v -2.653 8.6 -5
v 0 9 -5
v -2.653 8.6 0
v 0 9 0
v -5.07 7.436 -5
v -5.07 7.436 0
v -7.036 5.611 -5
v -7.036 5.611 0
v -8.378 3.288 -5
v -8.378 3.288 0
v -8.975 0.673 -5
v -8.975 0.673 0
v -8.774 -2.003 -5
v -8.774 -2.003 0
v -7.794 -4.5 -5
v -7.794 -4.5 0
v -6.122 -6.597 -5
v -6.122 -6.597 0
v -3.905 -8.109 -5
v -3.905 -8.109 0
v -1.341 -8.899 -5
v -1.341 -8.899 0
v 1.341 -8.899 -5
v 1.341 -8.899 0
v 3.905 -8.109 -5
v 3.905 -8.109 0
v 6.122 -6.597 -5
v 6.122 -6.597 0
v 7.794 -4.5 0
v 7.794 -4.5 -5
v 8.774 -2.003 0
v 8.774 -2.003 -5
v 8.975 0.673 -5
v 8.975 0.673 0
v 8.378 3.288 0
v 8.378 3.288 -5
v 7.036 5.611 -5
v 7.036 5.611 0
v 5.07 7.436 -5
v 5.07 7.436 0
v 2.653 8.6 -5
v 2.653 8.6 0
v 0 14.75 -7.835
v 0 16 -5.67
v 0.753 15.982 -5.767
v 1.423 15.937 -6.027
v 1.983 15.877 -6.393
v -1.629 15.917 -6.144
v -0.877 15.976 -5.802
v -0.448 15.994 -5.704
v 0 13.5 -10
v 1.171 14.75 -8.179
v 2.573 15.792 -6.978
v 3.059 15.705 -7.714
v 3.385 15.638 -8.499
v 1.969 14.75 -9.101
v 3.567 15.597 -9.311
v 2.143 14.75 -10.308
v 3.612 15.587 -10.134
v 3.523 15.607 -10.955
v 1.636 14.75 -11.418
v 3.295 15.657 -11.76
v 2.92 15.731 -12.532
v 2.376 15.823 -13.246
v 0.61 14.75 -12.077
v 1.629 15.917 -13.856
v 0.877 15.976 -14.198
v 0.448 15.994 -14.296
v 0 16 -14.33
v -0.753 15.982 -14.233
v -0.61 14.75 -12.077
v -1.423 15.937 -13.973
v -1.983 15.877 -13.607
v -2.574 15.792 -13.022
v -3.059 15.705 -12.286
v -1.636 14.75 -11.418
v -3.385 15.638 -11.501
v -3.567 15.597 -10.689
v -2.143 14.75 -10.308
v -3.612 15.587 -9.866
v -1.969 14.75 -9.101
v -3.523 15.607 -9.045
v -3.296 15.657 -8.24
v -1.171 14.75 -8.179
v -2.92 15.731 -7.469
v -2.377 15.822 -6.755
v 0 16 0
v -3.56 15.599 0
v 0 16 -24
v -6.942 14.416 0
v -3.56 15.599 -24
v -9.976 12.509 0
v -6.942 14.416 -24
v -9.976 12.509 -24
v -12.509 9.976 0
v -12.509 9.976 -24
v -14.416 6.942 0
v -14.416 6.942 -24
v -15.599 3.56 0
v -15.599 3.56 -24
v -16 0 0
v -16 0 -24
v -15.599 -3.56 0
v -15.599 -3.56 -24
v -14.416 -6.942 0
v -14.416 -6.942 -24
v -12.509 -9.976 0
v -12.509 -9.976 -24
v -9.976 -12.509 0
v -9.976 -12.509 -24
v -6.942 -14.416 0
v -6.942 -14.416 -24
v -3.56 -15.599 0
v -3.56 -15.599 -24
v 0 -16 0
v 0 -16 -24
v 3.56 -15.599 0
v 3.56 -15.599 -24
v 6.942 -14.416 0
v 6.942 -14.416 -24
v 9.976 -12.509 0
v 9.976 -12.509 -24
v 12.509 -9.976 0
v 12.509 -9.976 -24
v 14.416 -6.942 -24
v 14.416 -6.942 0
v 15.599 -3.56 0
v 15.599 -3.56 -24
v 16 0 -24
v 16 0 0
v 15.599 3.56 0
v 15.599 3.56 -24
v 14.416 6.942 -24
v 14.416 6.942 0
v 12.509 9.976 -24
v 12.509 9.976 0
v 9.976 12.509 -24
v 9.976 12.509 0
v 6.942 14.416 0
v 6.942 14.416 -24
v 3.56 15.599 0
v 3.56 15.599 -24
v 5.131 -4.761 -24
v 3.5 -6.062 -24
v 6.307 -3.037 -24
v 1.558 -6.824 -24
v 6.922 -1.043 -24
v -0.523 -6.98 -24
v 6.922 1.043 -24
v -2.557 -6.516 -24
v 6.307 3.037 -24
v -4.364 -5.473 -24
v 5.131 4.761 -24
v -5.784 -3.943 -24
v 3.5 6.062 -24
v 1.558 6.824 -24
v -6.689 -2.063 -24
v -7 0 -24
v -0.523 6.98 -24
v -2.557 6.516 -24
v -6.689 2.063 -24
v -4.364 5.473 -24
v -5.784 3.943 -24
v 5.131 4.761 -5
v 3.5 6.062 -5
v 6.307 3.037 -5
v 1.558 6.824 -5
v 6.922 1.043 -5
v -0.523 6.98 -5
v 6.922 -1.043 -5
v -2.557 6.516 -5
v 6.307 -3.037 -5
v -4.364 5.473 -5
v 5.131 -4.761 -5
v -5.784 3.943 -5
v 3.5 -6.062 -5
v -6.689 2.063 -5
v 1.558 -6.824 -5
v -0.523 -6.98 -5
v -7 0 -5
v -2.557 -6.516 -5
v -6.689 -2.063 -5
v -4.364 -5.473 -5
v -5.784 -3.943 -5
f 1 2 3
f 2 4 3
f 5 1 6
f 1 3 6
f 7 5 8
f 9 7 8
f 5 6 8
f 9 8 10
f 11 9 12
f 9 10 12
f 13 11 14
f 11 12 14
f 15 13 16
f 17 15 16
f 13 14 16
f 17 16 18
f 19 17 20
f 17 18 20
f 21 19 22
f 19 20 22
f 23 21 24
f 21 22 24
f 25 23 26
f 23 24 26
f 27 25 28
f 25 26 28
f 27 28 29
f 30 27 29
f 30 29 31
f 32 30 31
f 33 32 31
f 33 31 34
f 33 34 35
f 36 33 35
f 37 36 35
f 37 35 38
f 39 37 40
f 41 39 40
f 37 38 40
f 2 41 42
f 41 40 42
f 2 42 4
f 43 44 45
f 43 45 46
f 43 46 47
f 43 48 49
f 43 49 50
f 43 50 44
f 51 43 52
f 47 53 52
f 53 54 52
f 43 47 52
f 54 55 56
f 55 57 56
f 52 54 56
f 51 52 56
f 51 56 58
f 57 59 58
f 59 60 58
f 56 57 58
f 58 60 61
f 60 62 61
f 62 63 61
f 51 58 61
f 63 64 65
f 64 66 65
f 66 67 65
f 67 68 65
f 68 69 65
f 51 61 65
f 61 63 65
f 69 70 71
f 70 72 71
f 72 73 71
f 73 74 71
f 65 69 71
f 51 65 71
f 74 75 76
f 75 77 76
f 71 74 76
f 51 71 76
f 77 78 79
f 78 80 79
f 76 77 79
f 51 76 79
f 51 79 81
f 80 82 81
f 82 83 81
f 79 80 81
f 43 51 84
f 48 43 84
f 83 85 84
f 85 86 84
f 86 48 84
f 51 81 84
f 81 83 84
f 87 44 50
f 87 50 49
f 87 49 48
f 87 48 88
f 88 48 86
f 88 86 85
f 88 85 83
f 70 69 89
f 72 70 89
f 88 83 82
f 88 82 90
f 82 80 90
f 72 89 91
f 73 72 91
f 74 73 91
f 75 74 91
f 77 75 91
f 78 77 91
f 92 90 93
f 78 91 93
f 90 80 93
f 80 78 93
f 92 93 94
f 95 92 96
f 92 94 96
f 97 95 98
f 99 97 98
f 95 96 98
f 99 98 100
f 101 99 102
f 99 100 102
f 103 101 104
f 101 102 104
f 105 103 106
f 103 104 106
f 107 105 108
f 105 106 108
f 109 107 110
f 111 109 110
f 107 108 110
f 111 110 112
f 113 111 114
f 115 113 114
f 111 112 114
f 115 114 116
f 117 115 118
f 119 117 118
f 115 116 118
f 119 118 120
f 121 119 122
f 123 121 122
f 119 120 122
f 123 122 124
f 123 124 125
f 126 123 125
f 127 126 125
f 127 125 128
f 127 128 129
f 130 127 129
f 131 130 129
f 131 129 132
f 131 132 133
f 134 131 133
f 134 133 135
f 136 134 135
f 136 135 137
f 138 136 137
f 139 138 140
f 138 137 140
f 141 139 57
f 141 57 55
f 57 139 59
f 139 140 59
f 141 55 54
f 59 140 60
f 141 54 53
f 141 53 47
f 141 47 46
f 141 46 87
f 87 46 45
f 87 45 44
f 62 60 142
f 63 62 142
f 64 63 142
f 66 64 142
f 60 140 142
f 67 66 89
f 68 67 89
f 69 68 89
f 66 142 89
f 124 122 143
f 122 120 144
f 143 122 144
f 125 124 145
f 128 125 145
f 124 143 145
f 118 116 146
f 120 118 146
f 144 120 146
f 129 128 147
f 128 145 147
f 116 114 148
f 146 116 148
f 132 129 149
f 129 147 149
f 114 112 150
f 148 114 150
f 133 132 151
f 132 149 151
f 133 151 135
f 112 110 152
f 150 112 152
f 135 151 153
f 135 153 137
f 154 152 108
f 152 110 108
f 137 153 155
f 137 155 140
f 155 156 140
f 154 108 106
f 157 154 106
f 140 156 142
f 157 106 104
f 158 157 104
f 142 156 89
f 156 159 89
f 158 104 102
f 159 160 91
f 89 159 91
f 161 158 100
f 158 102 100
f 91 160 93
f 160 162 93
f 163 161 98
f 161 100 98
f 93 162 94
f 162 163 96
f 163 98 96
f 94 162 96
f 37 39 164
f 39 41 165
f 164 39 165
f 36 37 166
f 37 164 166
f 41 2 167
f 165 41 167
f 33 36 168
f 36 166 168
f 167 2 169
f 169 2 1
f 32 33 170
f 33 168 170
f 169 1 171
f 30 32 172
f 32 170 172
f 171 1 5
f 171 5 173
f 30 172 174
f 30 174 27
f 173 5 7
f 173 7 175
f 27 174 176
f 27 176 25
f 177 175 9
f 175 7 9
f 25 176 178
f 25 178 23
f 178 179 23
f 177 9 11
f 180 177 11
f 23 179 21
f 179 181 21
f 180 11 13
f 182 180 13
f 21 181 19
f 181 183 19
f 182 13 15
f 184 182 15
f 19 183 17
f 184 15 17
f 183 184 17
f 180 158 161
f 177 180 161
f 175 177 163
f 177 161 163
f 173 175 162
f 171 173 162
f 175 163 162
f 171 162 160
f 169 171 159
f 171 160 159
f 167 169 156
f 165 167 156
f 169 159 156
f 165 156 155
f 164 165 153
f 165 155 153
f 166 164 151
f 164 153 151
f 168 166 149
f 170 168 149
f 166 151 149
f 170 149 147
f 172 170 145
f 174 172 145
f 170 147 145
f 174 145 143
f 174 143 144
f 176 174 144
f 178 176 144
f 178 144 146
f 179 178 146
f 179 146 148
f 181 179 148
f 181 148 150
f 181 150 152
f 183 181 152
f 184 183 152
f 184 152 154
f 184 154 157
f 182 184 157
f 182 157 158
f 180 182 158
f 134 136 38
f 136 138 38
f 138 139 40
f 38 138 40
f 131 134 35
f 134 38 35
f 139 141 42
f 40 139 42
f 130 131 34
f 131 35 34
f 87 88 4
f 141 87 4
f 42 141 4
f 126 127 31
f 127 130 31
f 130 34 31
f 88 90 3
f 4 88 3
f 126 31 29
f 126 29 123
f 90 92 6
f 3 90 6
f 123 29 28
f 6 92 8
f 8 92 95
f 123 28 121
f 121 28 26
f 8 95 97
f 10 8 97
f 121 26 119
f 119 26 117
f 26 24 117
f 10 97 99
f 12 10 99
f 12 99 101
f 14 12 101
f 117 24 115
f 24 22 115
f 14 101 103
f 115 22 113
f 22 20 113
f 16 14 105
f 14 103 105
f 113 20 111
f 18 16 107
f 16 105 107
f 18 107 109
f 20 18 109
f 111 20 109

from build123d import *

# Parameters (mm, degrees)
HOLE_WIZARD_M16_1_D = 14


with BuildPart() as part:
    # 草圖1 → 旋轉1 (revolve)
    with BuildSketch(Plane(origin=(0, 0, 0), x_dir=(0, 0, -1), z_dir=(1, 0, 0))):
        Polygon((5, 0), (5, 9), (0, 9), (0, 16), (24, 16), (24, 0), align=None)
    revolve(axis=Axis((0, 0, -24), (0, 0, 1)))

    # 草圖2 → 除料-旋轉1 (revolve, cut)
    with BuildSketch(Plane(origin=(0, 0, 0), x_dir=(0, 0, -1), z_dir=(1, 0, 0))):
        Polygon((3.7183072, 19.324474935), (10, 19.324474935), (10, 13.5), (3.7183072, 17.126737029), align=None)
    revolve(axis=Axis((0, 11.187716982, -10), (0, 1, 0)), mode=Mode.SUBTRACT)

    # M16 螺紋孔1 (through all)
    with Locations(Plane.XY.offset(-5)):
        with Locations((0, 0)):
            Hole(HOLE_WIZARD_M16_1_D / 2)


solid = part.part
